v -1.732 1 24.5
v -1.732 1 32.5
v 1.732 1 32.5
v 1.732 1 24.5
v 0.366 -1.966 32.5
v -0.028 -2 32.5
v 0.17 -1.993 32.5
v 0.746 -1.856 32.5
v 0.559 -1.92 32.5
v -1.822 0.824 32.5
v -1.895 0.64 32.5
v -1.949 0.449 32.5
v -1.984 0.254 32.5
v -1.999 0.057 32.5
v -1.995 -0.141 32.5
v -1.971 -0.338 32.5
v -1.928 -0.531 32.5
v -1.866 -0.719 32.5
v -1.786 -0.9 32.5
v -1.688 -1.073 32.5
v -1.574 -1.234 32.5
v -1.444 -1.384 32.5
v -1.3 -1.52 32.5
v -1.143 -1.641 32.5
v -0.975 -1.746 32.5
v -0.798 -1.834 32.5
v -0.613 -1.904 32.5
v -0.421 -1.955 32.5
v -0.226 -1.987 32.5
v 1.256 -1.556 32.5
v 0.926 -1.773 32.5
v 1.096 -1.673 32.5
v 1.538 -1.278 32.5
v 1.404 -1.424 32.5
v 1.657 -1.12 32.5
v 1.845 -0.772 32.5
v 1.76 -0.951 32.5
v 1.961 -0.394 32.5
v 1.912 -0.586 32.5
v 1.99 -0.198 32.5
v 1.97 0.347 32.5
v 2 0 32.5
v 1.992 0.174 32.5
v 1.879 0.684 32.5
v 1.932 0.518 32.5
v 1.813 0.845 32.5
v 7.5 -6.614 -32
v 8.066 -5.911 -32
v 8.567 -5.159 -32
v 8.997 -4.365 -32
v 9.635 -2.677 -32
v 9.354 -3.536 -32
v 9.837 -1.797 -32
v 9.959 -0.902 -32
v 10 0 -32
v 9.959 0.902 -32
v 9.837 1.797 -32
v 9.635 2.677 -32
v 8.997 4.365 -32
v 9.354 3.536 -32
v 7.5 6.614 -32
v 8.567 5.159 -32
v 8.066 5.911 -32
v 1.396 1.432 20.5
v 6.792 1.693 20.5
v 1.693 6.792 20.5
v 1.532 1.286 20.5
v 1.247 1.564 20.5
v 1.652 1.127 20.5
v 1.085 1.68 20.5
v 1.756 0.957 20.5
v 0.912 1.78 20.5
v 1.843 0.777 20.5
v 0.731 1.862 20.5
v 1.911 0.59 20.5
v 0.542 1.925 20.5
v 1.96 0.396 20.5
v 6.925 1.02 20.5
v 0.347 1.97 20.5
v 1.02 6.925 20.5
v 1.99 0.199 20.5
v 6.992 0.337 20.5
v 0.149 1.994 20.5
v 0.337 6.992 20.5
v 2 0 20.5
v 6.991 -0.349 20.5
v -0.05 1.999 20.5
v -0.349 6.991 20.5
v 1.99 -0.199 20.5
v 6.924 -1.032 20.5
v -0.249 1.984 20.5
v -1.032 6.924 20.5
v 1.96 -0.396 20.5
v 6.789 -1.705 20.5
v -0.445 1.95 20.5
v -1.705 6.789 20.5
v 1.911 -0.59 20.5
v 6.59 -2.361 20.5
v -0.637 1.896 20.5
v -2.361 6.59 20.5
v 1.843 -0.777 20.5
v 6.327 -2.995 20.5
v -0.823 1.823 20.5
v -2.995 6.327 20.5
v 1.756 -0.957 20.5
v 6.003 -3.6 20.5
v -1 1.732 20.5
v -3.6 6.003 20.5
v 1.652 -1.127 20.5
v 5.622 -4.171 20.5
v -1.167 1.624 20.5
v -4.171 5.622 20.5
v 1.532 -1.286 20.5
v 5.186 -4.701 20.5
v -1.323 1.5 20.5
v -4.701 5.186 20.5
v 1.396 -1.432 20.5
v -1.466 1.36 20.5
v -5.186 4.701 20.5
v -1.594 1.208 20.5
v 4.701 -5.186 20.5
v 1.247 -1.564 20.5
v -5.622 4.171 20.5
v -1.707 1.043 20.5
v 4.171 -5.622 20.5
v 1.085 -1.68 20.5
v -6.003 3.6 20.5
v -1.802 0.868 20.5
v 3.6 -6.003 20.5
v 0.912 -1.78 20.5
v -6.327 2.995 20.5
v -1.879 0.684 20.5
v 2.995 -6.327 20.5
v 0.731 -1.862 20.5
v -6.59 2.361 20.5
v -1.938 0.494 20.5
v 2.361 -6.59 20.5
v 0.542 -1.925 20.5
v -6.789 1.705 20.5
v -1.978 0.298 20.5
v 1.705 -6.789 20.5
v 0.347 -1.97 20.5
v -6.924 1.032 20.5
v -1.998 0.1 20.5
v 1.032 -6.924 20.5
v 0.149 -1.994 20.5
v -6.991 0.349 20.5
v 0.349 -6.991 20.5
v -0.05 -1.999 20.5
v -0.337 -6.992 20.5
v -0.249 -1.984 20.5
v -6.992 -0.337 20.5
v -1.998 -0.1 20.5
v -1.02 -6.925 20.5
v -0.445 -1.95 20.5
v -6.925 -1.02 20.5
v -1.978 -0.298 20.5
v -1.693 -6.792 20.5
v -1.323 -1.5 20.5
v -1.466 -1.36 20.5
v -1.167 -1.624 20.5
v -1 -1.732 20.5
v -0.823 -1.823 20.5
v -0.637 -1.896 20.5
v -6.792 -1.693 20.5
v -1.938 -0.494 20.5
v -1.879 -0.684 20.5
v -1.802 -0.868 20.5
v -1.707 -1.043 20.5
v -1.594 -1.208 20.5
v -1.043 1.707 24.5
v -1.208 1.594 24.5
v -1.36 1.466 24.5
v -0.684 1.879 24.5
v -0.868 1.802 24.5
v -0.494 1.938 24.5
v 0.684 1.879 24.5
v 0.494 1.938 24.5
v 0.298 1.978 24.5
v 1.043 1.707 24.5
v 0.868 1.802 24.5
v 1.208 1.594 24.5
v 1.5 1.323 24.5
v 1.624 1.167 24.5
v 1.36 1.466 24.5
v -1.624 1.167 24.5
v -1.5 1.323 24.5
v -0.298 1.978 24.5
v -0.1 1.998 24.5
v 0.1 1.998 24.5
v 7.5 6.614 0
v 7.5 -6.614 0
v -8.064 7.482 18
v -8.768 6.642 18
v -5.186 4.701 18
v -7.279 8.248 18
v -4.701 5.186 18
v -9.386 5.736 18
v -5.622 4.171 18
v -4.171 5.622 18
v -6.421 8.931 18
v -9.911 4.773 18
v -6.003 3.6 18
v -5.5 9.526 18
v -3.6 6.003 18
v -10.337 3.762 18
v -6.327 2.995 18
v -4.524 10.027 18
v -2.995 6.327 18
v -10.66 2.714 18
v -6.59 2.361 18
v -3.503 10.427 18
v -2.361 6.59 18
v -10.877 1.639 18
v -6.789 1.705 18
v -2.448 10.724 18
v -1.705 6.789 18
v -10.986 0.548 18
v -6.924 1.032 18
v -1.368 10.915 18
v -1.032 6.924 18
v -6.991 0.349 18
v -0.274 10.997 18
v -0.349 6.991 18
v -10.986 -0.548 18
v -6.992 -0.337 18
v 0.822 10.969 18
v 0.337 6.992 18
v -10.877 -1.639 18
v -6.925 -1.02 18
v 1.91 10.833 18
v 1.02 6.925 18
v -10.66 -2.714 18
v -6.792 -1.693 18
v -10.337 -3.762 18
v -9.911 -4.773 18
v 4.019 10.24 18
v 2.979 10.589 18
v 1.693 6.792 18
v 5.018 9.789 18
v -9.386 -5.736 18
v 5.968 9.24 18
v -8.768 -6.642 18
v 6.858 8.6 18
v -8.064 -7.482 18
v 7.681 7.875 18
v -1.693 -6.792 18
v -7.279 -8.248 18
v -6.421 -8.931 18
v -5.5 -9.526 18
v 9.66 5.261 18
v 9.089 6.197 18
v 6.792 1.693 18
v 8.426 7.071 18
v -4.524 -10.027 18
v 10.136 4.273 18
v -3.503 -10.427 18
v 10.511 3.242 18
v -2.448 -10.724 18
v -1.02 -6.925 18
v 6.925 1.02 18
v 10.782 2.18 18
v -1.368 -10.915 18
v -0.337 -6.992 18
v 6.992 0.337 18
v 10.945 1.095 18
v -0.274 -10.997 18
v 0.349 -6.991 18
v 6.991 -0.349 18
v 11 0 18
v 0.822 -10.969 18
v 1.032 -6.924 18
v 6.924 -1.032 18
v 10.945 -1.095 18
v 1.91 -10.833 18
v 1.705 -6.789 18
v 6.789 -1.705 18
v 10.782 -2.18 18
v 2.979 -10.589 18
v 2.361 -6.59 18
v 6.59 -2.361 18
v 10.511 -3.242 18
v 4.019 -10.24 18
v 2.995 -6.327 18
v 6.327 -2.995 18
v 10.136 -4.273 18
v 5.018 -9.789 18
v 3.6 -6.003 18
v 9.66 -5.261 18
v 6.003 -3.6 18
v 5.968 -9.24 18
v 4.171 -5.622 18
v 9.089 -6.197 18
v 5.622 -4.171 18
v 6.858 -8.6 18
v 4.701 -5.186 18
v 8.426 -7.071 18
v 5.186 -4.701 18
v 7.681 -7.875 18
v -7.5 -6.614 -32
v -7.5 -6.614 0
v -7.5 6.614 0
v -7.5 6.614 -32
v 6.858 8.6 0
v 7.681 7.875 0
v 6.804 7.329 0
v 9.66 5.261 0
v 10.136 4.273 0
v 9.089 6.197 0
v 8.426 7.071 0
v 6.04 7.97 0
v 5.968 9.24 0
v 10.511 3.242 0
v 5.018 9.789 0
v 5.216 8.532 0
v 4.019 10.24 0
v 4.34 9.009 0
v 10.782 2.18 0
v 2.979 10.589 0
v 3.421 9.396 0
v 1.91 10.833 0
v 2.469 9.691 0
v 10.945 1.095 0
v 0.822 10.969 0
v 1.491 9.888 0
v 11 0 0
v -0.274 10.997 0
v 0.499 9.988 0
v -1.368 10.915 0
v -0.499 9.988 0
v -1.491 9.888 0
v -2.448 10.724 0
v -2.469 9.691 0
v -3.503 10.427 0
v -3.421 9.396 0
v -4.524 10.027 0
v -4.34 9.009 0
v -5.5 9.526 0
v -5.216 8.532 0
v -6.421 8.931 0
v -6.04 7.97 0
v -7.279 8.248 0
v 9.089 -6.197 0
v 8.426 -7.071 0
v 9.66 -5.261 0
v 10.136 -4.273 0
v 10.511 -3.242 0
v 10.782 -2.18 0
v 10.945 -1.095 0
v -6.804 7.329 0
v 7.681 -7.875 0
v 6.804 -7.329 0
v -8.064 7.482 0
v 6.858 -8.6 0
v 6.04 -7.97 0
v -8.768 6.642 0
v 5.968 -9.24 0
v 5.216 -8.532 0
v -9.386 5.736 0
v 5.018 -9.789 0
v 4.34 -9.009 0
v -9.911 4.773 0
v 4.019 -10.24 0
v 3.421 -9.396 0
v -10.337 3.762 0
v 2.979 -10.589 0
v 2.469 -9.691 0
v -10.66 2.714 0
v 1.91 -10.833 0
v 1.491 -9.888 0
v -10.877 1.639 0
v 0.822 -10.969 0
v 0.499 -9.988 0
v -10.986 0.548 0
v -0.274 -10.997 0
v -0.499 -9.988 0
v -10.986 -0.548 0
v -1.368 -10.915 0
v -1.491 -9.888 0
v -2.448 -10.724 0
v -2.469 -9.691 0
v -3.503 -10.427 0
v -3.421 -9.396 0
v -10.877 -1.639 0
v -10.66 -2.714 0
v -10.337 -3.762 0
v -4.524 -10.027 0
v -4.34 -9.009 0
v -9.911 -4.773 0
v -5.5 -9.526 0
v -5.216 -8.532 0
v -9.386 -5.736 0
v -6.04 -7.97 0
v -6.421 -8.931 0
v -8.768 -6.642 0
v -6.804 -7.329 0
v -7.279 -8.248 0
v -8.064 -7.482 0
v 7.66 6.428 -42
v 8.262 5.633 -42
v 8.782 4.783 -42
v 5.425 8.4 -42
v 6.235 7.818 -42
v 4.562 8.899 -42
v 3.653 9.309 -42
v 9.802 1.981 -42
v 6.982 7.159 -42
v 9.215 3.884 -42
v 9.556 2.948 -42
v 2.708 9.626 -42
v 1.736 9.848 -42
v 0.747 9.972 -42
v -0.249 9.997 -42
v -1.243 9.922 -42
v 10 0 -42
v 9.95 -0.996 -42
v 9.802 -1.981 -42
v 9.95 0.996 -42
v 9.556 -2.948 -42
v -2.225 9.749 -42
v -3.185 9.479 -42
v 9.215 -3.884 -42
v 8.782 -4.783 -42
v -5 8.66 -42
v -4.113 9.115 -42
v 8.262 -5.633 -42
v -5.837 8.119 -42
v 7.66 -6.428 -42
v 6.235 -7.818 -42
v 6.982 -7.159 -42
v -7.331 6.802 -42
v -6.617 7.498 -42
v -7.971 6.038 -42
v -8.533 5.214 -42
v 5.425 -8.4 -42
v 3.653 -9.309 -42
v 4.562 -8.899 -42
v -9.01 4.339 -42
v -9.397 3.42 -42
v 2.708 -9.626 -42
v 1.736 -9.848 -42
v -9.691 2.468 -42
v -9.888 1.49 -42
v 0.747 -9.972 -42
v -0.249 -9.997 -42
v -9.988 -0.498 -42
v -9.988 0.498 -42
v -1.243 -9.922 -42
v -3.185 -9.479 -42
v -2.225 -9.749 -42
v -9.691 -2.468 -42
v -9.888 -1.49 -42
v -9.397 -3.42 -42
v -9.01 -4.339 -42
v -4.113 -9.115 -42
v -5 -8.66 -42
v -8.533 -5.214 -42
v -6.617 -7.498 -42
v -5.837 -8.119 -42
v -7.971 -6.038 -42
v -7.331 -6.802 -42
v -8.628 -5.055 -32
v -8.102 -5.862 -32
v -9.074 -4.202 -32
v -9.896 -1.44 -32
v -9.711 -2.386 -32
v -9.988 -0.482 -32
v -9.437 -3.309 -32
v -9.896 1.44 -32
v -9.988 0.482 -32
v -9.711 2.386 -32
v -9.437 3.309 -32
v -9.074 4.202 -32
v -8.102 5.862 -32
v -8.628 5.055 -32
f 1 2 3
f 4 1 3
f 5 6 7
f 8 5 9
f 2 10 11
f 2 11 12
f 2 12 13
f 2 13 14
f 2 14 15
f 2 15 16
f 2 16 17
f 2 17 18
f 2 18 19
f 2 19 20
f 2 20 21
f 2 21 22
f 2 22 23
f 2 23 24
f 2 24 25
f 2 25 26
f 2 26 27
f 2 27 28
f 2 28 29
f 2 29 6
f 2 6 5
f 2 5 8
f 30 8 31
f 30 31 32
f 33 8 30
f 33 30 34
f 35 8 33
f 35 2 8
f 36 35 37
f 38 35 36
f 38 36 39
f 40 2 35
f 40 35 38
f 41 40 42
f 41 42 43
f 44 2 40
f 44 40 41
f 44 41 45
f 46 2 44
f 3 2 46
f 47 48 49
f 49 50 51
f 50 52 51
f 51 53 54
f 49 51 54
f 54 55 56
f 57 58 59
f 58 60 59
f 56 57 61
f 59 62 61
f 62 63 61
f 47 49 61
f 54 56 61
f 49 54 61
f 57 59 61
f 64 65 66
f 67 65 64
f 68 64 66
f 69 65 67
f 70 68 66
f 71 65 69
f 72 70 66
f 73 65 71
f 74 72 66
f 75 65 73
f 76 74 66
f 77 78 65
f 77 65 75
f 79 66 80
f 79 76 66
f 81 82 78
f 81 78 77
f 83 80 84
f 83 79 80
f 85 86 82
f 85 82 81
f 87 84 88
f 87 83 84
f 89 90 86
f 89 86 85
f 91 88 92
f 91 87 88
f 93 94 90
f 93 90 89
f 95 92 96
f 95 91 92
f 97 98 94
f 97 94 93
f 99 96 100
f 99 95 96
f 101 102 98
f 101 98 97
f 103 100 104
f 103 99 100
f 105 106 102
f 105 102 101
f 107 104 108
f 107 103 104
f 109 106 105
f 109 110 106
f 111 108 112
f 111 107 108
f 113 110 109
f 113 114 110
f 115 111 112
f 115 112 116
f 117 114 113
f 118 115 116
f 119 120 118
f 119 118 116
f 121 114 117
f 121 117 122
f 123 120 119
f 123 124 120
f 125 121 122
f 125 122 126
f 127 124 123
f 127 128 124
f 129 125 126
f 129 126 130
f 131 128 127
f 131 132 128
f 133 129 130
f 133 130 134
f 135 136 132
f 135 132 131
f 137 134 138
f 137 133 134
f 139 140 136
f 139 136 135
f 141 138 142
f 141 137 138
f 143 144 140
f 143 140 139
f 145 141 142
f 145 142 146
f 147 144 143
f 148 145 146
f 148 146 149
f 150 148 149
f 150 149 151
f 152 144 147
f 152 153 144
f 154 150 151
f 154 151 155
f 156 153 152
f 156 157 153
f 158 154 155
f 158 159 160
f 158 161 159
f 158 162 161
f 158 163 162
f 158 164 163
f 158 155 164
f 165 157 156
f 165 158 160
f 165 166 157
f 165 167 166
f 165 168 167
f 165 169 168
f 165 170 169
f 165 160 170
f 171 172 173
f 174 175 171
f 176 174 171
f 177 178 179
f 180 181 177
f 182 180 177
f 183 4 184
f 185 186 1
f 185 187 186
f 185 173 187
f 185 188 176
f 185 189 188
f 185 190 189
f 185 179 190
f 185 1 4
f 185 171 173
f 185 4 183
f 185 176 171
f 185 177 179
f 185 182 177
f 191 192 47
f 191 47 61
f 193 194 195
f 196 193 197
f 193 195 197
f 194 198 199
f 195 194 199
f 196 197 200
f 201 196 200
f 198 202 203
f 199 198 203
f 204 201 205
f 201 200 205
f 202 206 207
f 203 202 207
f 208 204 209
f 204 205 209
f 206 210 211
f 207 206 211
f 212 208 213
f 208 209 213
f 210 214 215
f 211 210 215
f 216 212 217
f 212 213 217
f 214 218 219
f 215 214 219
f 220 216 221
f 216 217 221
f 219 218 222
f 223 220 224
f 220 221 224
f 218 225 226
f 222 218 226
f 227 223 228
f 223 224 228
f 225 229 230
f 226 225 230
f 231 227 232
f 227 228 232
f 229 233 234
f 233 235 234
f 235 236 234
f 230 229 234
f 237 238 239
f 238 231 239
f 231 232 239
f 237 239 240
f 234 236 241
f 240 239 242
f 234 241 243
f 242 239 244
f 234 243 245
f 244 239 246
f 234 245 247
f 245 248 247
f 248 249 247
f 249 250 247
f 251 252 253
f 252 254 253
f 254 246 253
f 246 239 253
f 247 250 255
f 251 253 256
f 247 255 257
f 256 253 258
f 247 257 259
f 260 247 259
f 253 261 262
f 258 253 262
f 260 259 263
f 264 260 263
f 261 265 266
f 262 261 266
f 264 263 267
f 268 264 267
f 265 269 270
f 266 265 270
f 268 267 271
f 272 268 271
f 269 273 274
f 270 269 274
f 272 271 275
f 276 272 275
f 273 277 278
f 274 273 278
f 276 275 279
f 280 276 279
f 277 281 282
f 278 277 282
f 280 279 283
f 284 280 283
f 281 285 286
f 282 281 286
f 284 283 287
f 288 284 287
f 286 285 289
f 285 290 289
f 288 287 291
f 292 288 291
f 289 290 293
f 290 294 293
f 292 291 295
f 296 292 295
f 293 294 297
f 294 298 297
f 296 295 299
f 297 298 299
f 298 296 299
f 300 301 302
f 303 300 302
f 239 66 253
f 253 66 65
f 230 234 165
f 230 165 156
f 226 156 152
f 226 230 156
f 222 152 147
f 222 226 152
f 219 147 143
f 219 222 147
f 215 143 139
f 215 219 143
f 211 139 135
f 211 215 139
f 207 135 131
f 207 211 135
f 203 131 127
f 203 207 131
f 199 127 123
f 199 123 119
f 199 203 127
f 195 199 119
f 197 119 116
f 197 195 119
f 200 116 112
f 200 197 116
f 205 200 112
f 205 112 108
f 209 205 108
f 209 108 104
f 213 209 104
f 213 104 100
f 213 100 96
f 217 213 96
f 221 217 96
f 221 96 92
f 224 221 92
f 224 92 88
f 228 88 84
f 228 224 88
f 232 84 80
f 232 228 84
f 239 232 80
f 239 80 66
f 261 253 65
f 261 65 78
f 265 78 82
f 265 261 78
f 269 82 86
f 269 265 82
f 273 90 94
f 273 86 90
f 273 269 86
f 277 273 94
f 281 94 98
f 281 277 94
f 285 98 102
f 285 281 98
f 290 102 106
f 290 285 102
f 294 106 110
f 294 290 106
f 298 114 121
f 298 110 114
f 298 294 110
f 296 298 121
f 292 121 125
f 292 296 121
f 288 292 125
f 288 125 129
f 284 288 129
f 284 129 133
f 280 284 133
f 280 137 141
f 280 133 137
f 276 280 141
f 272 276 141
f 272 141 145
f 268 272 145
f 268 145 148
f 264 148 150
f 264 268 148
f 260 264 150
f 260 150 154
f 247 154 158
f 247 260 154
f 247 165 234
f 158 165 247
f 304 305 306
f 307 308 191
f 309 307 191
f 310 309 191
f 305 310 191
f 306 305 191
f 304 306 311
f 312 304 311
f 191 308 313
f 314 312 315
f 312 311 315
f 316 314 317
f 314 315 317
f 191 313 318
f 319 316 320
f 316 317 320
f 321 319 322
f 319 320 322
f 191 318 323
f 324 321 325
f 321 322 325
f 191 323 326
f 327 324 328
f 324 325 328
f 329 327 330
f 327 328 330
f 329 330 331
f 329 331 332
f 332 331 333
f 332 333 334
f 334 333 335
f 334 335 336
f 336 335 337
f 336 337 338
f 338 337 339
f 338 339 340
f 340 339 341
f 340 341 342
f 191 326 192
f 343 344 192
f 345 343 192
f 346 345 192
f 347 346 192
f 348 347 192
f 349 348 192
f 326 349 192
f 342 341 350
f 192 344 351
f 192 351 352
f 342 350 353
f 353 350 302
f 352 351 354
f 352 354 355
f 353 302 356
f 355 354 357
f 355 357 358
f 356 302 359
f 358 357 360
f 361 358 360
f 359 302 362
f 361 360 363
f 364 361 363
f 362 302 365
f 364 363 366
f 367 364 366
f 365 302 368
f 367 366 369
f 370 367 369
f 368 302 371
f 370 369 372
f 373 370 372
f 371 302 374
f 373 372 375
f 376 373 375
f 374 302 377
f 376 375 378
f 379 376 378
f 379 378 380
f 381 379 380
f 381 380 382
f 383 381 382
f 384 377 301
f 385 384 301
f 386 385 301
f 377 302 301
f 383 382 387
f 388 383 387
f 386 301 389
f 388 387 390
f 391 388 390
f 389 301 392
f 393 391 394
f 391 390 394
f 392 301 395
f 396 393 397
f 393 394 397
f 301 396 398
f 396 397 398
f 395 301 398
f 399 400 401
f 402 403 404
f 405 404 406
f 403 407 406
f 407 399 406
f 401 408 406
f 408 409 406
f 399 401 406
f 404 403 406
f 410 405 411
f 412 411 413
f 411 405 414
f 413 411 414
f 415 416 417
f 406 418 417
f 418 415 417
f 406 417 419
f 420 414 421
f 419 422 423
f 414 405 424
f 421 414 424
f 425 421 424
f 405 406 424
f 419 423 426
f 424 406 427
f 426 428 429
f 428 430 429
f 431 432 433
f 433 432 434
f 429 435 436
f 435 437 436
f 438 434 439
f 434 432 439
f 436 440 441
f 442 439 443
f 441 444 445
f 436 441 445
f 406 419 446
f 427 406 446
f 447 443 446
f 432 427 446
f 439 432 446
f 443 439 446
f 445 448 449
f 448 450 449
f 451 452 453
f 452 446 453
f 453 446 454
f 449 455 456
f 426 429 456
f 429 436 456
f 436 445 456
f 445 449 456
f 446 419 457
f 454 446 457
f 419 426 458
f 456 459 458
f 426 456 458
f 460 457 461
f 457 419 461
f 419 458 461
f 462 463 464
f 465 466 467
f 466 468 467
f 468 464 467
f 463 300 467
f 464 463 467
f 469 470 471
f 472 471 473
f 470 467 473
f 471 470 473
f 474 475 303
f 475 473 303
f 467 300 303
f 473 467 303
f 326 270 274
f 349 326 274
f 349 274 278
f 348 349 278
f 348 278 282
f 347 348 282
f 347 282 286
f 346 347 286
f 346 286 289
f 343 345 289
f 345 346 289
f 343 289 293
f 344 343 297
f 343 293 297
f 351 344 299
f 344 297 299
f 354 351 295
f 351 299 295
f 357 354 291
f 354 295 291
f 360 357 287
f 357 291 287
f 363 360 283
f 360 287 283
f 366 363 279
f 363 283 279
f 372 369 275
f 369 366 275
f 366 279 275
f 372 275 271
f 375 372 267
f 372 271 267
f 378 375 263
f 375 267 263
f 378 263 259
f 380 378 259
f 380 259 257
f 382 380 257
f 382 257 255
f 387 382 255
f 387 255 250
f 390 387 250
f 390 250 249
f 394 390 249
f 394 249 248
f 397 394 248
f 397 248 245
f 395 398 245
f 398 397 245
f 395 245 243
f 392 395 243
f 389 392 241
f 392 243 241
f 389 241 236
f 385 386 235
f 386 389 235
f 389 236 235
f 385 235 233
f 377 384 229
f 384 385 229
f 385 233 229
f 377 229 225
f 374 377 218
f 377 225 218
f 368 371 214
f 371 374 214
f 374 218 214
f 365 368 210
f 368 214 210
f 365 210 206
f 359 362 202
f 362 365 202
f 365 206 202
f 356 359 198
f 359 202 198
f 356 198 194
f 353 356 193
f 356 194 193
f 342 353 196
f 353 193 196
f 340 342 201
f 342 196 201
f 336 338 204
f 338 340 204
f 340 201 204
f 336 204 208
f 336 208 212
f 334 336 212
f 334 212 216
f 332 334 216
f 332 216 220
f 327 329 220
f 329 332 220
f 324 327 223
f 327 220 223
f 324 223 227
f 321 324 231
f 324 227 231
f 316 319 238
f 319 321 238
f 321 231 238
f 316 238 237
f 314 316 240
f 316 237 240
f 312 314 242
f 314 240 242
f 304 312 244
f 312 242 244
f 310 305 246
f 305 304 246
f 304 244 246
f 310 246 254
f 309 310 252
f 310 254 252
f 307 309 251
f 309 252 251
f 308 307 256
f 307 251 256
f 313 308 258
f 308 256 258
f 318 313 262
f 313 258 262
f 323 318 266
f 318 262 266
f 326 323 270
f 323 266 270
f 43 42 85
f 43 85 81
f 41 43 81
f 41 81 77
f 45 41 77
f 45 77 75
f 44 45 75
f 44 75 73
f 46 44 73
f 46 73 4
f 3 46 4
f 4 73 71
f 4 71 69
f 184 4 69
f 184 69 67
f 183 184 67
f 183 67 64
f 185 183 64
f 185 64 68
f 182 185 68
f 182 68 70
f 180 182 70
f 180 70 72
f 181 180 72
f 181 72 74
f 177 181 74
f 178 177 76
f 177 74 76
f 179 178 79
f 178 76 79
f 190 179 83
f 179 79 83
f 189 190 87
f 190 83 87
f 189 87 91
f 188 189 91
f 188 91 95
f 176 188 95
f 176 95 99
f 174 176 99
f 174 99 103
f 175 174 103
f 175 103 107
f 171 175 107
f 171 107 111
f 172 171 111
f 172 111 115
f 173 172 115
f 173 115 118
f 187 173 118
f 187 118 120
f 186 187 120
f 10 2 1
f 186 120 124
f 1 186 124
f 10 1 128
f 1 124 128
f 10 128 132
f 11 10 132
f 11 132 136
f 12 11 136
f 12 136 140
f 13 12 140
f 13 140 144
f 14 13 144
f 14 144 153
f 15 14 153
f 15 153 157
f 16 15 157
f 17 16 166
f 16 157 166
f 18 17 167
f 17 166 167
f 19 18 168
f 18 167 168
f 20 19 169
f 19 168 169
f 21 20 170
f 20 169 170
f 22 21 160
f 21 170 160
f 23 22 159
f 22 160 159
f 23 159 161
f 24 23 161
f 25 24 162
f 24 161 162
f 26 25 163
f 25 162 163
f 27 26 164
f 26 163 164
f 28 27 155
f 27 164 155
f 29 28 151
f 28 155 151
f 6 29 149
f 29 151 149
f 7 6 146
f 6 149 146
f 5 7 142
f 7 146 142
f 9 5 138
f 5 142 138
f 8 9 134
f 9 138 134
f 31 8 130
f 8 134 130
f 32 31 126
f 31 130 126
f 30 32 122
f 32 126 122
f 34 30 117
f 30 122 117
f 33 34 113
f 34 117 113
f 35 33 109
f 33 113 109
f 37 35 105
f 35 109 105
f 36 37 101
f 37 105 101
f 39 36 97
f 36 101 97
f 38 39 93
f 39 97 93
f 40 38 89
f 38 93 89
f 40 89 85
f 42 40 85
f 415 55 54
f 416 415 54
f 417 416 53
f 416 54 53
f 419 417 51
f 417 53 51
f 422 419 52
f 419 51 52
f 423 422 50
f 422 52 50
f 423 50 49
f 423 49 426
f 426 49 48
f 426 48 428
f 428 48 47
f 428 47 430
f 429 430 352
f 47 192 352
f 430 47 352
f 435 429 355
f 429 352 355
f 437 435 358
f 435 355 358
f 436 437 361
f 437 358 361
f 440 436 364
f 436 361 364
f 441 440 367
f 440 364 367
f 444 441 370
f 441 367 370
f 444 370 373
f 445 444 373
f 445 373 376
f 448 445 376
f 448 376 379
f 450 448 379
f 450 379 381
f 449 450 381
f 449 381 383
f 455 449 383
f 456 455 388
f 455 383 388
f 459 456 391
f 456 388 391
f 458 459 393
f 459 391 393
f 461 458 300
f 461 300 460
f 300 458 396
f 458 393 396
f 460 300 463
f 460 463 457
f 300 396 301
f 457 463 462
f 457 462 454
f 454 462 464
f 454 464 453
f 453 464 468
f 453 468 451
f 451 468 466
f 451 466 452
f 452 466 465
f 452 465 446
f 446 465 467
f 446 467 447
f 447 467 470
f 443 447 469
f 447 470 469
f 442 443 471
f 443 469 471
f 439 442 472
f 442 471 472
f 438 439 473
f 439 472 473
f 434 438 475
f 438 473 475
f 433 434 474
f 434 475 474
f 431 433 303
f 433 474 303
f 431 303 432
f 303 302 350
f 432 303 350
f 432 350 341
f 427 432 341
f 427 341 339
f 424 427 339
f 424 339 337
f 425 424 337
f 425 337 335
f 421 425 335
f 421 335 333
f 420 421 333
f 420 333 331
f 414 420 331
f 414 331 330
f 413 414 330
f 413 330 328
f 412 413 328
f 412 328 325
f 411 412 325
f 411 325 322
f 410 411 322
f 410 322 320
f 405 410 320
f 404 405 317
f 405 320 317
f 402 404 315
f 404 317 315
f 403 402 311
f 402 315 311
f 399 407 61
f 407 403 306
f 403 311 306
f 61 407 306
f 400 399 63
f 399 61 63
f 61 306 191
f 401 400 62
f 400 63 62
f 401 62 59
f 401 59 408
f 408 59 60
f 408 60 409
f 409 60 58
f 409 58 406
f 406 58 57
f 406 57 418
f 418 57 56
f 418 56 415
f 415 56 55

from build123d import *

# Parameters (mm, degrees)
SKETCH2_W           = 2.5
SKETCH2_H           = 7
SKETCH2_W_2         = 32
SKETCH2_H_2         = 10
SKETCH2_W_3         = 10
SKETCH4_W           = 3.5
SKETCH4_H           = 22
CUT_EXTRUDE1_DEPTH  = 32
CUT_EXTRUDE2_DEPTH  = 2.5
SKETCH6_R           = 2
BOSS_EXTRUDE1_DEPTH = 12
SKETCH7_W           = 4
SKETCH7_H           = 2
CUT_EXTRUDE3_DEPTH  = 8


with BuildPart() as part:
    # Sketch2 → Revolve1 (revolve)
    with BuildSketch(Plane(origin=(0, 0, 0), x_dir=(0, 0, -1), z_dir=(1, 0, 0)), mode=Mode.PRIVATE) as revolve1_sk:
        with Locations((-19.25, 3.5)):
            Rectangle(SKETCH2_W, SKETCH2_H)
        Polygon((-18, 0), (0, 0), (0, 10), (0, 11), (-18, 11), (-18, 7), align=None)
        with Locations((16, 5)):
            Rectangle(SKETCH2_W_2, SKETCH2_H_2)
        with Locations((37, 5)):
            Rectangle(SKETCH2_W_3, SKETCH2_H_2)
    revolve(revolve1_sk.sketch.rotate(Axis((0, 0, 51.295546559), (0, 0, -1)), 90), axis=Axis((0, 0, 51.295546559), (0, 0, -1)))

    # Sketch4 → Cut-Extrude1 (cut)
    with BuildSketch(Plane(origin=(0, 0, 0), x_dir=(-1, 0, 0), z_dir=(0, 0, -1))):
        with Locations((-9.25, 0)):
            Rectangle(SKETCH4_W, SKETCH4_H)
        with Locations((9.25, 0)):
            Rectangle(SKETCH4_W, SKETCH4_H)
    extrude(amount=CUT_EXTRUDE1_DEPTH, mode=Mode.SUBTRACT)

    # Sketch5 → Cut-Extrude2 (cut)
    with BuildSketch(Plane.XY.offset(20.5)):
        Polygon((-9.192388155, 0.707106781), (0.707106781, -9.192388155), (-2.828427125, -12.727922061), (-12.727922061, -2.828427125), align=None)
        Polygon((-0.707106781, 9.192388155), (9.192388155, -0.707106781), (12.727922061, 2.828427125), (2.828427125, 12.727922061), align=None)
    extrude(amount=-CUT_EXTRUDE2_DEPTH, mode=Mode.SUBTRACT)

    # Sketch6 → Boss-Extrude1 (add)
    with BuildSketch(Plane.XY.offset(20.5)):
        Circle(SKETCH6_R)
    extrude(amount=BOSS_EXTRUDE1_DEPTH)

    # Sketch7 → Cut-Extrude3 (cut)
    with BuildSketch(Plane.XY.offset(32.5)):
        with Locations((0, 2)):
            Rectangle(SKETCH7_W, SKETCH7_H)
    extrude(amount=-CUT_EXTRUDE3_DEPTH, mode=Mode.SUBTRACT)


solid = part.part
